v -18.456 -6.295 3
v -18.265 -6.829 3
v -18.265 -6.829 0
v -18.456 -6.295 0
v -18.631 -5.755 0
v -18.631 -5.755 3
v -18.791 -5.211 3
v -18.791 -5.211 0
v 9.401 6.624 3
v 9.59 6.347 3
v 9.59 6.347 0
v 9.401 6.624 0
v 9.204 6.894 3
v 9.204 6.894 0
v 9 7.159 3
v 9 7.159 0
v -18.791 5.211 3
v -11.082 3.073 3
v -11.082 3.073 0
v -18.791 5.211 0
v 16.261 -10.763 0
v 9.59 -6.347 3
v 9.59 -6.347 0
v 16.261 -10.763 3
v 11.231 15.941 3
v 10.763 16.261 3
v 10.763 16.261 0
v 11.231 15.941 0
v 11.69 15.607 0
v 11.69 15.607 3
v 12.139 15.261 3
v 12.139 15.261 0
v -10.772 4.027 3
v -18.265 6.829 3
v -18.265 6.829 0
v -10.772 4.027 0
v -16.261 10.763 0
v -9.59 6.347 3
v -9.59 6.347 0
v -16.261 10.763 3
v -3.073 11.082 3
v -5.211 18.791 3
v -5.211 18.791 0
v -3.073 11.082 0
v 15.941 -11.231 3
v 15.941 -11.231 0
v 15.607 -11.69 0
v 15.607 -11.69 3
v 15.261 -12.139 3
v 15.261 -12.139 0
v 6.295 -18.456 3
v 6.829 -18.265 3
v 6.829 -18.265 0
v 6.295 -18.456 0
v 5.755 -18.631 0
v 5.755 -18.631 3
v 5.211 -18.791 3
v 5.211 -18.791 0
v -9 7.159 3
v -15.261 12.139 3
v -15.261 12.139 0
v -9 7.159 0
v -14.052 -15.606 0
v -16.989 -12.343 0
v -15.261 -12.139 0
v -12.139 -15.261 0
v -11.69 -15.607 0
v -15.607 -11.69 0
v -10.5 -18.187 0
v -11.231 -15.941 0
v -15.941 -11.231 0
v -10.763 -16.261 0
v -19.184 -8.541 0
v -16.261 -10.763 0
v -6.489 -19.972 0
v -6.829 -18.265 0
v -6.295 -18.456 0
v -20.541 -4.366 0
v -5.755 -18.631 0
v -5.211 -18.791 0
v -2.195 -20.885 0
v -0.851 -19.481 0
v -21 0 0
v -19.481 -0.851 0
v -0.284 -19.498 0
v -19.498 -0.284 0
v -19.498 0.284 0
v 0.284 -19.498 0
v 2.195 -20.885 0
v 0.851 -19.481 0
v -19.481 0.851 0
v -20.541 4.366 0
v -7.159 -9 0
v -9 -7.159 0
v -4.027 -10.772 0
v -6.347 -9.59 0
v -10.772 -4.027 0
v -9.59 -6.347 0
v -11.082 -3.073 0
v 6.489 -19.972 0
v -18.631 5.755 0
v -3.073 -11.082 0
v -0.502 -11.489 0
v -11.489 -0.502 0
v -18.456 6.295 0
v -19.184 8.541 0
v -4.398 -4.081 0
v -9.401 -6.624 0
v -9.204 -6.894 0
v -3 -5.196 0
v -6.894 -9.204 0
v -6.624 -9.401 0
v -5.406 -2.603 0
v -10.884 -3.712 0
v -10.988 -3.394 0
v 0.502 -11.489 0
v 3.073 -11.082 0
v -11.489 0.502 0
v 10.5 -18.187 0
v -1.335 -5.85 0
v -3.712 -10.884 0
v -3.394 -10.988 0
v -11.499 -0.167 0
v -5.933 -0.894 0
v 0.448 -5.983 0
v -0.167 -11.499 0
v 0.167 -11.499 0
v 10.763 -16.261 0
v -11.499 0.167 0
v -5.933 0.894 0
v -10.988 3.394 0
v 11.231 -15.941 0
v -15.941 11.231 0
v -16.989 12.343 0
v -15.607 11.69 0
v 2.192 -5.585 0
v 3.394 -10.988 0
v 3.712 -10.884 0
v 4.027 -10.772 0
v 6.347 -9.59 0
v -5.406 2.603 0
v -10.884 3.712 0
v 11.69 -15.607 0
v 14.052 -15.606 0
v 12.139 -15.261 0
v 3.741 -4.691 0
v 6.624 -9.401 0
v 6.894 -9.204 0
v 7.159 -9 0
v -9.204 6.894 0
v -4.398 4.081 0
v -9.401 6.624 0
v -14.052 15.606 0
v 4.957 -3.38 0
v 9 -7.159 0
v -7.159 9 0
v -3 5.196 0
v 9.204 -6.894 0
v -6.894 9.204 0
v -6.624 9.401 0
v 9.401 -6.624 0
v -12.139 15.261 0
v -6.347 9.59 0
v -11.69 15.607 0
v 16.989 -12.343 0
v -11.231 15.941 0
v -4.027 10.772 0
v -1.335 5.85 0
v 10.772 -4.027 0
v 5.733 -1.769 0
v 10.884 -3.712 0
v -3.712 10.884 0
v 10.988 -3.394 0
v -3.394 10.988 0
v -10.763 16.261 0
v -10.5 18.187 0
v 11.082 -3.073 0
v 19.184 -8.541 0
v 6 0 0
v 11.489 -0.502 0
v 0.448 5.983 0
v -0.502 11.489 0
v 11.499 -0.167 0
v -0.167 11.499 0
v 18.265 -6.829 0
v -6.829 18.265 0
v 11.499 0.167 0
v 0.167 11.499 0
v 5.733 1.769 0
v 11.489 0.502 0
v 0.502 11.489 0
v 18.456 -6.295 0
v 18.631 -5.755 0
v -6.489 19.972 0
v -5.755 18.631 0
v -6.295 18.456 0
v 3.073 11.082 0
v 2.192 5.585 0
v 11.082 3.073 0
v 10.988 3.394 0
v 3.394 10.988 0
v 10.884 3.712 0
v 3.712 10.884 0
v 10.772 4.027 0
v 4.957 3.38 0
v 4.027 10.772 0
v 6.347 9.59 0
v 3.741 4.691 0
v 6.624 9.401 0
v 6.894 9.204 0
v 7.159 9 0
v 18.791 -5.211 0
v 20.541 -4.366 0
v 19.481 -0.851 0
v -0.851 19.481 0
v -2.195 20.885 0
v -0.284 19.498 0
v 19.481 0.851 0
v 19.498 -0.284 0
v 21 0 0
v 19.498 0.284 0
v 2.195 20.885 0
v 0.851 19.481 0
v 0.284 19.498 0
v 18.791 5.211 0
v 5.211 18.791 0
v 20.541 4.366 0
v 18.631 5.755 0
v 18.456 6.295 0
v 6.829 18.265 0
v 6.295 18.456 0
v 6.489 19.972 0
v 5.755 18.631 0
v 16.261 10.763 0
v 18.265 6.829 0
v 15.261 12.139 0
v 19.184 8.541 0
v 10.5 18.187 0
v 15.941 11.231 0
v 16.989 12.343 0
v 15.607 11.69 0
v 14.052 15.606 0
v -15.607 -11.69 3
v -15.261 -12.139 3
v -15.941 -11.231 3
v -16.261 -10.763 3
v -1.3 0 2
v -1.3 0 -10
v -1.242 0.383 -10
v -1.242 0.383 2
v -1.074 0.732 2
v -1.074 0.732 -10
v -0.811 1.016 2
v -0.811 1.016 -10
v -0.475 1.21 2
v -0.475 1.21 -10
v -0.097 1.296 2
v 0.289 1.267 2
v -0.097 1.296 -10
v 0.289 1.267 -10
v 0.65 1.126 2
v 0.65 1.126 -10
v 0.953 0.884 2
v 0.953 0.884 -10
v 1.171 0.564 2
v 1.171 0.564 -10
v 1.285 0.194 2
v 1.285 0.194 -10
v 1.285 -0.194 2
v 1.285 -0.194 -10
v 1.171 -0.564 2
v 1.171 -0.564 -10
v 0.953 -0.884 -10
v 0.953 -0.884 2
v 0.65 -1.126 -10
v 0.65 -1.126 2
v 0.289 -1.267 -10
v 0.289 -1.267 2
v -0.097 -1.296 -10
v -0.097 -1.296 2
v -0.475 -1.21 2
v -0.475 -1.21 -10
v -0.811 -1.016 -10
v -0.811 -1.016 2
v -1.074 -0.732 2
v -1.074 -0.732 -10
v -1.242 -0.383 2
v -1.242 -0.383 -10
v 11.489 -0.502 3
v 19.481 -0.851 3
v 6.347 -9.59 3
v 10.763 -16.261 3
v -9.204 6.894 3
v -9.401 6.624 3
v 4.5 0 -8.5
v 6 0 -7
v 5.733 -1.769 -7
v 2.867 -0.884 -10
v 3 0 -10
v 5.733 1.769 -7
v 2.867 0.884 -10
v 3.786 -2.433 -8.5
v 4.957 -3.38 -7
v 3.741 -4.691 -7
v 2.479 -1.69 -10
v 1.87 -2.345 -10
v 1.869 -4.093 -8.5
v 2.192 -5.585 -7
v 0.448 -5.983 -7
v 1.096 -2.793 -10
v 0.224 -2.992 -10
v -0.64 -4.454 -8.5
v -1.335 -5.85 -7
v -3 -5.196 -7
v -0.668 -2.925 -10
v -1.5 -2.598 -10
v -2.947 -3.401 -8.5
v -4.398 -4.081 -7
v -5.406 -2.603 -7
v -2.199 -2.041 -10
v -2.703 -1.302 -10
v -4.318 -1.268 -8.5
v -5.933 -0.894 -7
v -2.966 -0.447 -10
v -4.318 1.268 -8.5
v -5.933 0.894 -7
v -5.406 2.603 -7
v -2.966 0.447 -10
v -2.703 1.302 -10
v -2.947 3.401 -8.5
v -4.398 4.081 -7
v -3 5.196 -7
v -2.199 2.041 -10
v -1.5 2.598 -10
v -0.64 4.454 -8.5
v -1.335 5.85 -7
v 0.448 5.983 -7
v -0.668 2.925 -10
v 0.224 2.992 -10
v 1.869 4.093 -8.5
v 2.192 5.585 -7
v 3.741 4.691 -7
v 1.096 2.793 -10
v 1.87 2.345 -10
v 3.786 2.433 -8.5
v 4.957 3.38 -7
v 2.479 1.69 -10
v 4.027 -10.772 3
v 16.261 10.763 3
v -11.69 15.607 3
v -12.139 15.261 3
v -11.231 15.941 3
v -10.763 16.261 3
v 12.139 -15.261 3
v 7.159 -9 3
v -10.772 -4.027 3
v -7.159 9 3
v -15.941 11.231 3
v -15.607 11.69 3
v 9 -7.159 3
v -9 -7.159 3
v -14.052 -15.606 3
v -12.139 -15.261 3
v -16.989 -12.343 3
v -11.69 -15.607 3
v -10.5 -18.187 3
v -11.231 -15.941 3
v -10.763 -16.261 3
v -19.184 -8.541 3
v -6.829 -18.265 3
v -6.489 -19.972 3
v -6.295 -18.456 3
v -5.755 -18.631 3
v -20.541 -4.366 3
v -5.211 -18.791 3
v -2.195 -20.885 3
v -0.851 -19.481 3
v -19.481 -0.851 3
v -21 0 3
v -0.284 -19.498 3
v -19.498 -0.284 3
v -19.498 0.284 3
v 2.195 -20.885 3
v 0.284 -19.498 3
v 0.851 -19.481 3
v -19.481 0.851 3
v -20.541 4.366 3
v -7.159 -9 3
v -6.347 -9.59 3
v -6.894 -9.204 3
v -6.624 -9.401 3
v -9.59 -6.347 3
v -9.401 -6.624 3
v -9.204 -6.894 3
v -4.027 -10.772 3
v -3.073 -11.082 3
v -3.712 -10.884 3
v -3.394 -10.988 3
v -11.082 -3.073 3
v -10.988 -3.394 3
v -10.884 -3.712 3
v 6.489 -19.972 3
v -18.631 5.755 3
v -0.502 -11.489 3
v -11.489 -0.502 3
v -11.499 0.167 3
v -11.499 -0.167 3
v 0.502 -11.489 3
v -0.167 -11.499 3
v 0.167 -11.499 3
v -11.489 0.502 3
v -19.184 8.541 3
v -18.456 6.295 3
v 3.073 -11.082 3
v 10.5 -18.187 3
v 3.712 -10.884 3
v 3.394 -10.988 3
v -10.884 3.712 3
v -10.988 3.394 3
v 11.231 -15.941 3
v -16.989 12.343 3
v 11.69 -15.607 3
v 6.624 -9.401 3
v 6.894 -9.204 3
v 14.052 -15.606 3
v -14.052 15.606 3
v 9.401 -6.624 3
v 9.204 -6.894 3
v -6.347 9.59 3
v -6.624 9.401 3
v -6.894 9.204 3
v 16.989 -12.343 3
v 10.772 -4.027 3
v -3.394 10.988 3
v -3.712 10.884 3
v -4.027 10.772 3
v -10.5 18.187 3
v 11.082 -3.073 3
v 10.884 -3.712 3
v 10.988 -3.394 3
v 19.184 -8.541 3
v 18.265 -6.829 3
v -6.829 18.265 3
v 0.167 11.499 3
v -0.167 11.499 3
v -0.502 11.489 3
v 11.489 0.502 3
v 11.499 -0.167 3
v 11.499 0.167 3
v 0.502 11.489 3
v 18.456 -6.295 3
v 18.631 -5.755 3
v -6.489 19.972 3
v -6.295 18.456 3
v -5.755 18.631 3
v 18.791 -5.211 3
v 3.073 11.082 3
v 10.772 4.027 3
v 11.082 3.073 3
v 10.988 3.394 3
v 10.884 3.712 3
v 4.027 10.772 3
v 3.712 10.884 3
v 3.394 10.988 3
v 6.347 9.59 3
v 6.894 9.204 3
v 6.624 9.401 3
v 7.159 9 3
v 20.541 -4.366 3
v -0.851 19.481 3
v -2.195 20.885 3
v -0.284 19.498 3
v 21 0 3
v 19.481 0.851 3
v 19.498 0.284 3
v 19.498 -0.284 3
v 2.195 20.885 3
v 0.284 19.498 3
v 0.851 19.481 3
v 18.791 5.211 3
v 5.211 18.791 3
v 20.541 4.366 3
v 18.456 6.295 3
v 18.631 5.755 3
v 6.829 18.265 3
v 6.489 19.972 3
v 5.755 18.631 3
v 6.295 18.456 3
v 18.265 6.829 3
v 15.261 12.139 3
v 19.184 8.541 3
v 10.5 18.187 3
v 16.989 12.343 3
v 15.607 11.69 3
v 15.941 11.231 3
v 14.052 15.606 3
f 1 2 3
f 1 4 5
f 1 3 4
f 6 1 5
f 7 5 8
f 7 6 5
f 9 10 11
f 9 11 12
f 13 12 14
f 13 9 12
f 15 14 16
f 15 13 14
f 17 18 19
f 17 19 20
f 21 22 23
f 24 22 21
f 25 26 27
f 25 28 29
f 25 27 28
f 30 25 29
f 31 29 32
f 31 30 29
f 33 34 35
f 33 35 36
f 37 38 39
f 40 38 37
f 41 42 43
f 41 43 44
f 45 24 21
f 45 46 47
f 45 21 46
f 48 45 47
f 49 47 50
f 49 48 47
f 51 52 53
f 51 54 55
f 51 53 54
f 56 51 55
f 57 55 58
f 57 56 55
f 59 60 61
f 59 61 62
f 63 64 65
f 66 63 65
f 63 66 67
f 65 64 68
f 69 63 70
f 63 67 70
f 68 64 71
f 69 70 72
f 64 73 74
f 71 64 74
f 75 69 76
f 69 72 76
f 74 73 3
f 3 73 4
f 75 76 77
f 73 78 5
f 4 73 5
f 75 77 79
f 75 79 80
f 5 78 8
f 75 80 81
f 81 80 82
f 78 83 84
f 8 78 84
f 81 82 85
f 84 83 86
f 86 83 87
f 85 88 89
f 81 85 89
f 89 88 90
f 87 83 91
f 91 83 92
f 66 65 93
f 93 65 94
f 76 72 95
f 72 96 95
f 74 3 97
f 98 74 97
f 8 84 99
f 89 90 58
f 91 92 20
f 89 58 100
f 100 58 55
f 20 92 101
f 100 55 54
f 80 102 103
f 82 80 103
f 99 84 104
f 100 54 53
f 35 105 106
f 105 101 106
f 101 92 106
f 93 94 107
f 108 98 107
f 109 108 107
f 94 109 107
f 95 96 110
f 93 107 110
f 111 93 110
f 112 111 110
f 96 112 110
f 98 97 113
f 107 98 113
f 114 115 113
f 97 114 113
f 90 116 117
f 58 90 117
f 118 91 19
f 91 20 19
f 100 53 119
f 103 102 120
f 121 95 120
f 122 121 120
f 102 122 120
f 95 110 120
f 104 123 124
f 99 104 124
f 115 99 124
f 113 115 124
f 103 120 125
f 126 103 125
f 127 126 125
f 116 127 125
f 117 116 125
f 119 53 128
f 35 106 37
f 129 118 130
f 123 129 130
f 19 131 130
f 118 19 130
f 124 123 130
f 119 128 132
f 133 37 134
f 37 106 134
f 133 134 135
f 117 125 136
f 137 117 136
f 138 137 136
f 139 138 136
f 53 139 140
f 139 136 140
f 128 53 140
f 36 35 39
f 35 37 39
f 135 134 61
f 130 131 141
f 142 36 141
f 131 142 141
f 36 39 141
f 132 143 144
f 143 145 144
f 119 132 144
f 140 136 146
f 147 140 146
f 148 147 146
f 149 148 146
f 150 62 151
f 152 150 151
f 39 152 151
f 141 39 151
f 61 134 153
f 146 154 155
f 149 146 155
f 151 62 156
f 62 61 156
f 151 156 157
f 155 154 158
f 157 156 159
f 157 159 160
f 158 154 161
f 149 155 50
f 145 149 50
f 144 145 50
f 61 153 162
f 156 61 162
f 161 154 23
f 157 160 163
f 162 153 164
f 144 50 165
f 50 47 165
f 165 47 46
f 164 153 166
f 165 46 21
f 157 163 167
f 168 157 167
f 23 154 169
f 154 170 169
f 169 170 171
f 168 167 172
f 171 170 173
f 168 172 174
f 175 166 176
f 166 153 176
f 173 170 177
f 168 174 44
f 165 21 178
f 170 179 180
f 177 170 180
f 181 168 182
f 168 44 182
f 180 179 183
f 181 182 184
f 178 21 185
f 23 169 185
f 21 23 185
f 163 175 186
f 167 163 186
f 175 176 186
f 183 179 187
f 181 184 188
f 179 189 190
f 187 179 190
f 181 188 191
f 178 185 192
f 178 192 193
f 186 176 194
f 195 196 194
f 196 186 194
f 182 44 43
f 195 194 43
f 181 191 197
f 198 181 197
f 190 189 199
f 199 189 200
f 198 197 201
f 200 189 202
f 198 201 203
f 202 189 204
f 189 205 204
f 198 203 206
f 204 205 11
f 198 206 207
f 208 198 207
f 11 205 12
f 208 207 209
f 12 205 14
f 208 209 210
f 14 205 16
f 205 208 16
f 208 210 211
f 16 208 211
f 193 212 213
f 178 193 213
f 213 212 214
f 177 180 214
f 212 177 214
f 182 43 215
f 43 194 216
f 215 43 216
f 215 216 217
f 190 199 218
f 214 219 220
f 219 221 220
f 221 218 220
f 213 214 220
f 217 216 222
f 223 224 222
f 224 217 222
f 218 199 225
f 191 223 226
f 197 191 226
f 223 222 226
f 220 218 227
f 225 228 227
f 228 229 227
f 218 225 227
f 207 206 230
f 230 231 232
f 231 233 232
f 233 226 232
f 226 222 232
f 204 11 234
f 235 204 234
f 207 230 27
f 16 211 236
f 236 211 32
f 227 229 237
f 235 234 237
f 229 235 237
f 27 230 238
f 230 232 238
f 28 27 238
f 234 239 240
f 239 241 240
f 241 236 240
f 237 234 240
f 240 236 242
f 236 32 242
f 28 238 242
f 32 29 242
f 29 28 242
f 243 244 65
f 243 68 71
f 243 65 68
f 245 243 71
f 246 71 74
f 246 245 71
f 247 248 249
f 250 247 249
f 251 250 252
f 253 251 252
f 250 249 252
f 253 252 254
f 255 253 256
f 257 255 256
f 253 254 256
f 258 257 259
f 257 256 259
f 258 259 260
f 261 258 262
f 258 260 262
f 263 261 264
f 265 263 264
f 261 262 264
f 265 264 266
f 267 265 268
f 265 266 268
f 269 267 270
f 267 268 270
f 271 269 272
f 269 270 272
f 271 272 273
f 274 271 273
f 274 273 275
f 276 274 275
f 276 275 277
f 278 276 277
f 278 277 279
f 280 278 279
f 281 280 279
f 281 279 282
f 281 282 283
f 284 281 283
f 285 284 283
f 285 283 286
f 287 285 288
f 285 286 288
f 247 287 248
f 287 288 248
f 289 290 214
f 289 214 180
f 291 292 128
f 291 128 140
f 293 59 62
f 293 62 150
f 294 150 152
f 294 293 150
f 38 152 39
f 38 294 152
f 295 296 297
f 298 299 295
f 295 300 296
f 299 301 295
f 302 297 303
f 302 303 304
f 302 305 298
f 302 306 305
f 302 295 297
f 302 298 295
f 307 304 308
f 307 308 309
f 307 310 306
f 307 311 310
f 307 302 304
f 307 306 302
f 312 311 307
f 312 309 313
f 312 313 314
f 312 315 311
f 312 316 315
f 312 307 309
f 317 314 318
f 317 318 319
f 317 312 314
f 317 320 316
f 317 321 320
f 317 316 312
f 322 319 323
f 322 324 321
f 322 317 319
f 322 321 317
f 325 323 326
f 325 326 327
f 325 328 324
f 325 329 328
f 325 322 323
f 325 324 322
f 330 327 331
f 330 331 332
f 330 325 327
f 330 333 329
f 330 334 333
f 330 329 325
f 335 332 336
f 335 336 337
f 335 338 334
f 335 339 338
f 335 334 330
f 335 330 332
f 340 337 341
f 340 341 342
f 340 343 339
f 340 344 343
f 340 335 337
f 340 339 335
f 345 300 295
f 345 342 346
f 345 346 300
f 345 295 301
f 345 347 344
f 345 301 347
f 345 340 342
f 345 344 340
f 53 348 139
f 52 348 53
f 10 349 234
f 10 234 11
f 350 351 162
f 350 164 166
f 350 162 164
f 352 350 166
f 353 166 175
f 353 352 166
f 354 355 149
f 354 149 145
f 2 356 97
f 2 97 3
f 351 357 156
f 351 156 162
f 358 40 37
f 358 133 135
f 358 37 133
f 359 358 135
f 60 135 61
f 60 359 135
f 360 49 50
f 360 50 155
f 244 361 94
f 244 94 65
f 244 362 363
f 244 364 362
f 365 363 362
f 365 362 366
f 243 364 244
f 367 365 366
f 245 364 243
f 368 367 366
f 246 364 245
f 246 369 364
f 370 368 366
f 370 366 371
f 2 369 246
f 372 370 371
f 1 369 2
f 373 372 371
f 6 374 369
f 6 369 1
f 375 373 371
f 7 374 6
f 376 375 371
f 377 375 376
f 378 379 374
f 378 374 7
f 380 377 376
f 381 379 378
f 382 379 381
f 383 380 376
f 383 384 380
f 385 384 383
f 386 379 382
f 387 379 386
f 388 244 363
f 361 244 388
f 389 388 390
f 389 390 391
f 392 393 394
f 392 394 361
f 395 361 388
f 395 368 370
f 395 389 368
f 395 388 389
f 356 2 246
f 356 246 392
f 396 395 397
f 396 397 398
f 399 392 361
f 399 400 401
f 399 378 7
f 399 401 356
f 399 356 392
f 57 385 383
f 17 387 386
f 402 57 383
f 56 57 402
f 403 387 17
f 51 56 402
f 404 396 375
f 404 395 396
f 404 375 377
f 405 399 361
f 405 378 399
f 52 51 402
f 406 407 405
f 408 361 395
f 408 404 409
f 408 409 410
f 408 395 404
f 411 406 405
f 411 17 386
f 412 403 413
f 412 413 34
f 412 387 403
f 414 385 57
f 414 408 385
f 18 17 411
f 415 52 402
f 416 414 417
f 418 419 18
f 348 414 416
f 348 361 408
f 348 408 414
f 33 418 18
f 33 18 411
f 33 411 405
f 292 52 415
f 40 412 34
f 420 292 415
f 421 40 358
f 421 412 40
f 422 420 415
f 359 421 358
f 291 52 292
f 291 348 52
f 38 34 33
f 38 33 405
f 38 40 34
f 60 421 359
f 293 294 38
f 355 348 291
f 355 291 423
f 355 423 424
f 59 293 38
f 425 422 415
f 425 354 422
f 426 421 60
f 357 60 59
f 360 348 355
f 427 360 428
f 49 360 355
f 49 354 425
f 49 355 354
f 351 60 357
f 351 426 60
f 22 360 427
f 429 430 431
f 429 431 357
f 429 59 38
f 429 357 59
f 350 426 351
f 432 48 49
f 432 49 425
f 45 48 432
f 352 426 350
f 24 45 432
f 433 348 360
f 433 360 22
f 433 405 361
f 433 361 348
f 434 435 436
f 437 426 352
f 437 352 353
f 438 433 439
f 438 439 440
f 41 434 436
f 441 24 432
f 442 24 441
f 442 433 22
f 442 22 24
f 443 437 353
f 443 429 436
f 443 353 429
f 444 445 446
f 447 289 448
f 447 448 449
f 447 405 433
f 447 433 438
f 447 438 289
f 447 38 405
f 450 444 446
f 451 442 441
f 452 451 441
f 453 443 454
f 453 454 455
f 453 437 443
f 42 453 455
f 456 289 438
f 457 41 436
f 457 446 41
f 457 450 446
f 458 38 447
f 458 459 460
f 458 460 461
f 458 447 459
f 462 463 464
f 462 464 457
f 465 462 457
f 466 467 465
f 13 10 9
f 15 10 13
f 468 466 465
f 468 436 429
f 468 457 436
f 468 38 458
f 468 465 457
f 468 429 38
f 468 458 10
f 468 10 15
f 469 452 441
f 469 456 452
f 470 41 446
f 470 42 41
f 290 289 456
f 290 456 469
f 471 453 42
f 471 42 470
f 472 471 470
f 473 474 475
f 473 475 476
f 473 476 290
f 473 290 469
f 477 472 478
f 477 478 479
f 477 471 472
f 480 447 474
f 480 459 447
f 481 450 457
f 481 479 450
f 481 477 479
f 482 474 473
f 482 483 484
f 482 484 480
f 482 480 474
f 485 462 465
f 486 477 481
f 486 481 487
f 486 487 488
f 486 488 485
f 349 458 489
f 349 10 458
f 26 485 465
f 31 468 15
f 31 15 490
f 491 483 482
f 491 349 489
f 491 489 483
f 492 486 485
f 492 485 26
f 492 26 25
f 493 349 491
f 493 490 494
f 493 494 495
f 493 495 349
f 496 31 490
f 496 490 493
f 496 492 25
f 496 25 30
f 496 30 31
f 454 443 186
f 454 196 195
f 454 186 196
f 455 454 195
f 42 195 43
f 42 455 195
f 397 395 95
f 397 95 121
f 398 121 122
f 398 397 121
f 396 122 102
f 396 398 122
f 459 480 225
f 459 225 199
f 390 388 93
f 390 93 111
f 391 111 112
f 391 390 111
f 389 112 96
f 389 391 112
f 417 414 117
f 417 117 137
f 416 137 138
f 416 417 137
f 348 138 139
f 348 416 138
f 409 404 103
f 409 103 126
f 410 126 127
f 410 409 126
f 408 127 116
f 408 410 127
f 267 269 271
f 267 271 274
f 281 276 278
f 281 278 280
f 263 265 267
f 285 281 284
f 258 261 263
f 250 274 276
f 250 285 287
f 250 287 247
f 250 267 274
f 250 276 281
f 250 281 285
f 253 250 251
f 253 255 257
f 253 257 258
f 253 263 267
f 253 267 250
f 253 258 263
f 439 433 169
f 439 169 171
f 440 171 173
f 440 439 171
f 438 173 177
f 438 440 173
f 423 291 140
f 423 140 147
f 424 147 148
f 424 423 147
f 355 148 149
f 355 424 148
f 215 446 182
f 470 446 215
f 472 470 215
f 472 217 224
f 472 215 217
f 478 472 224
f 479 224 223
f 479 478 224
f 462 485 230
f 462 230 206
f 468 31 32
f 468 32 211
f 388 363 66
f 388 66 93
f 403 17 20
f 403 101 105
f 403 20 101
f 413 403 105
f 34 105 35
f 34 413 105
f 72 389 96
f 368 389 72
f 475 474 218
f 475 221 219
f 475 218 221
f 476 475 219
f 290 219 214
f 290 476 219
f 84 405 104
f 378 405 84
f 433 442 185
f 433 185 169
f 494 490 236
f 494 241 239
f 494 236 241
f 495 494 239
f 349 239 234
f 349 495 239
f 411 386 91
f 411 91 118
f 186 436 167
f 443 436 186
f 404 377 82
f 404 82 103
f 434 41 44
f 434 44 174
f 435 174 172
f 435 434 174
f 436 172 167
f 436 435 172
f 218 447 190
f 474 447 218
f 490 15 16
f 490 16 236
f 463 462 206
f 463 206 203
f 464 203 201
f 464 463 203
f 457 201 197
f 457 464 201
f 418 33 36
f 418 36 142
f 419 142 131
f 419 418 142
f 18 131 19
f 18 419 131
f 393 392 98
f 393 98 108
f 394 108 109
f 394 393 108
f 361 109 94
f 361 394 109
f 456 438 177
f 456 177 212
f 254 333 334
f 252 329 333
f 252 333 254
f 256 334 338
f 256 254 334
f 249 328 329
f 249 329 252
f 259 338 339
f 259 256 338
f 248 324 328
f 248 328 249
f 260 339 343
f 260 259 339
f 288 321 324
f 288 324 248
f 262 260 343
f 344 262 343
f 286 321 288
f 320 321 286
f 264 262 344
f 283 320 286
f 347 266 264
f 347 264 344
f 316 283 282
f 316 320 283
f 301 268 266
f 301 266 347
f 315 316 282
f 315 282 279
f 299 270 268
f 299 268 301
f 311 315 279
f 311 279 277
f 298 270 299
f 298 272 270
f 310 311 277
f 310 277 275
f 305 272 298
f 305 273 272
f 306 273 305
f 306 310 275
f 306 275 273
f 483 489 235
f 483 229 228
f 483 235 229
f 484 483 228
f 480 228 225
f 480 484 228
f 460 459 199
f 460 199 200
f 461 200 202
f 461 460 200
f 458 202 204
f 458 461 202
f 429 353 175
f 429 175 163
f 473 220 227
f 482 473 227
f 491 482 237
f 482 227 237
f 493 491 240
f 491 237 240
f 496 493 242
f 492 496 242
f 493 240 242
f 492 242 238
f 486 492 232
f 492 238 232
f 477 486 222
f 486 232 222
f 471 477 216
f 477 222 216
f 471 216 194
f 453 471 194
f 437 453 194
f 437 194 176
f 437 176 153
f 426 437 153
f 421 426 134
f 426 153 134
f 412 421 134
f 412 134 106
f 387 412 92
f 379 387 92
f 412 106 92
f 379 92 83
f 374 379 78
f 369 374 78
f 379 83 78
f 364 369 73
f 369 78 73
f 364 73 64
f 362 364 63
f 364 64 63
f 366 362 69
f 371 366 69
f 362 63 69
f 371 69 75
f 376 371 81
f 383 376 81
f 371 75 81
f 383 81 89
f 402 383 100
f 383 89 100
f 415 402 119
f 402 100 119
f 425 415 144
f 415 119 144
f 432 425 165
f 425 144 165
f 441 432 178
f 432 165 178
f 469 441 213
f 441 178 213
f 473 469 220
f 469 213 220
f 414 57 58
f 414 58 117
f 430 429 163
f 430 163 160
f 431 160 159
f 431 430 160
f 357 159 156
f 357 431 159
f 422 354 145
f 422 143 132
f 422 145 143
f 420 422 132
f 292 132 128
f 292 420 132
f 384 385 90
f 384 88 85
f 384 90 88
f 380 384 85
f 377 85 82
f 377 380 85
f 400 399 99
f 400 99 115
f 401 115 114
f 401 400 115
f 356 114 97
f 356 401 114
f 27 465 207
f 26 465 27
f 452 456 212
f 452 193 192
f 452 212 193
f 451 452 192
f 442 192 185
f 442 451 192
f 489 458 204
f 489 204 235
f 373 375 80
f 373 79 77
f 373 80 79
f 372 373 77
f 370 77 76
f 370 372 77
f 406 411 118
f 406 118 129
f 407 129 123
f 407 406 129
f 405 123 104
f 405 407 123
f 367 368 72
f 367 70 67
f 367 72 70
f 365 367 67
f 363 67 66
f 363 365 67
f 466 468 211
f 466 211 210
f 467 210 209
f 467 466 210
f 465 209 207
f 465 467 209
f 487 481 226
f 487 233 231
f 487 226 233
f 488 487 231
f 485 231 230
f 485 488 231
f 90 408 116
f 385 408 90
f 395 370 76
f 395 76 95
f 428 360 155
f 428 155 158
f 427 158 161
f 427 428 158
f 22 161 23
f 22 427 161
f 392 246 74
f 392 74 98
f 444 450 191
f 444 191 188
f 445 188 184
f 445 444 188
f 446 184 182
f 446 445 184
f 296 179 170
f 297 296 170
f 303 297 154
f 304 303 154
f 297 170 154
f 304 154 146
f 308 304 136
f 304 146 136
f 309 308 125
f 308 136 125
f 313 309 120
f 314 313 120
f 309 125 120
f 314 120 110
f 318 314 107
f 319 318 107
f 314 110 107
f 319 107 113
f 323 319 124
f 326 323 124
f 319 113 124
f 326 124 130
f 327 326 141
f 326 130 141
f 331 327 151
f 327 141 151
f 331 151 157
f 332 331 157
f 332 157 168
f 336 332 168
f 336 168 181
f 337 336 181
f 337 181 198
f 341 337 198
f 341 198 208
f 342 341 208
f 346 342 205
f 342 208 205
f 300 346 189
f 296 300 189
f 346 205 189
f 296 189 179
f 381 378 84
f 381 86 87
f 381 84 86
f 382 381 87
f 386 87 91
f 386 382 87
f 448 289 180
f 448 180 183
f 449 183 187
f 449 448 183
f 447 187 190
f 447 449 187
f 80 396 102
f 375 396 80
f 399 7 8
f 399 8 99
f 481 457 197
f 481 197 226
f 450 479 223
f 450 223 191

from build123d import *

# Parameters (mm, degrees)
ESBO_O1_R                = 21
RESSALTO_EXTRUS_O1_DEPTH = 3
CORTE_EXTRUS_O1_DEPTH    = 30.849623113
PADR_OCIRCULAR1_COUNT    = 20
ESBO_O7_R                = 6
RESSALTO_EXTRUS_O2_DEPTH = 10
CHANFRO1_SIZE            = 3
ESBO_O8_R                = 1.3
CORTE_EXTRUS_O3_DEPTH    = 12


with BuildPart() as part:
    # Esboço1 → Ressalto-extrusão1 (new body)
    with BuildSketch(Plane.XY):
        Circle(ESBO_O1_R)
    extrude(amount=RESSALTO_EXTRUS_O1_DEPTH)

    # Esboço5 → Corte-extrusão1 (cut, through all)
    with BuildSketch(Plane.XY.offset(3)):
        with BuildLine():
            Line((-0.501622955, 11.489054548), (-0.850578054, 19.481440321))
            ThreePointArc((-0.850578054, 19.481440321), (0, 19.5), (0.850578054, 19.481440321))
            Line((0.850578054, 19.481440321), (0.501622955, 11.489054548))
            ThreePointArc((0.501622955, 11.489054548), (0, 11.5), (-0.501622955, 11.489054548))
        make_face()
    corte_extrus_o1 = extrude(amount=-CORTE_EXTRUS_O1_DEPTH, mode=Mode.SUBTRACT)

    # PadrãoCircular1: Corte-extrusão1 ×20 about axis
    padr_ocircular1_axis = Axis((0, 0, 0), (0, 0, 1))
    for i in range(1, PADR_OCIRCULAR1_COUNT):
        add(corte_extrus_o1.rotate(padr_ocircular1_axis, i * 360 / PADR_OCIRCULAR1_COUNT), mode=Mode.SUBTRACT)

    # Esboço7 → Ressalto-extrusão2 (add)
    with BuildSketch(Plane(origin=(0, 0, 0), x_dir=(-1, 0, 0), z_dir=(0, 0, -1))):
        with Locations(Location((0, 0, 0), (0, 0, 180))):
            Circle(ESBO_O7_R)
    extrude(amount=RESSALTO_EXTRUS_O2_DEPTH)

    # Chanfro1
    chanfro1_edges = [part.edges().sort_by_distance(p)[0] for p in [
        (-6, 0, -10),
    ]]
    chamfer(chanfro1_edges, length=CHANFRO1_SIZE)

    # Esboço8 → Corte-extrusão3 (cut)
    with BuildSketch(Plane(origin=(0, 0, -10), x_dir=(-1, 0, 0), z_dir=(0, 0, -1))):
        Circle(ESBO_O8_R)
    extrude(amount=-CORTE_EXTRUS_O3_DEPTH, mode=Mode.SUBTRACT)


solid = part.part
